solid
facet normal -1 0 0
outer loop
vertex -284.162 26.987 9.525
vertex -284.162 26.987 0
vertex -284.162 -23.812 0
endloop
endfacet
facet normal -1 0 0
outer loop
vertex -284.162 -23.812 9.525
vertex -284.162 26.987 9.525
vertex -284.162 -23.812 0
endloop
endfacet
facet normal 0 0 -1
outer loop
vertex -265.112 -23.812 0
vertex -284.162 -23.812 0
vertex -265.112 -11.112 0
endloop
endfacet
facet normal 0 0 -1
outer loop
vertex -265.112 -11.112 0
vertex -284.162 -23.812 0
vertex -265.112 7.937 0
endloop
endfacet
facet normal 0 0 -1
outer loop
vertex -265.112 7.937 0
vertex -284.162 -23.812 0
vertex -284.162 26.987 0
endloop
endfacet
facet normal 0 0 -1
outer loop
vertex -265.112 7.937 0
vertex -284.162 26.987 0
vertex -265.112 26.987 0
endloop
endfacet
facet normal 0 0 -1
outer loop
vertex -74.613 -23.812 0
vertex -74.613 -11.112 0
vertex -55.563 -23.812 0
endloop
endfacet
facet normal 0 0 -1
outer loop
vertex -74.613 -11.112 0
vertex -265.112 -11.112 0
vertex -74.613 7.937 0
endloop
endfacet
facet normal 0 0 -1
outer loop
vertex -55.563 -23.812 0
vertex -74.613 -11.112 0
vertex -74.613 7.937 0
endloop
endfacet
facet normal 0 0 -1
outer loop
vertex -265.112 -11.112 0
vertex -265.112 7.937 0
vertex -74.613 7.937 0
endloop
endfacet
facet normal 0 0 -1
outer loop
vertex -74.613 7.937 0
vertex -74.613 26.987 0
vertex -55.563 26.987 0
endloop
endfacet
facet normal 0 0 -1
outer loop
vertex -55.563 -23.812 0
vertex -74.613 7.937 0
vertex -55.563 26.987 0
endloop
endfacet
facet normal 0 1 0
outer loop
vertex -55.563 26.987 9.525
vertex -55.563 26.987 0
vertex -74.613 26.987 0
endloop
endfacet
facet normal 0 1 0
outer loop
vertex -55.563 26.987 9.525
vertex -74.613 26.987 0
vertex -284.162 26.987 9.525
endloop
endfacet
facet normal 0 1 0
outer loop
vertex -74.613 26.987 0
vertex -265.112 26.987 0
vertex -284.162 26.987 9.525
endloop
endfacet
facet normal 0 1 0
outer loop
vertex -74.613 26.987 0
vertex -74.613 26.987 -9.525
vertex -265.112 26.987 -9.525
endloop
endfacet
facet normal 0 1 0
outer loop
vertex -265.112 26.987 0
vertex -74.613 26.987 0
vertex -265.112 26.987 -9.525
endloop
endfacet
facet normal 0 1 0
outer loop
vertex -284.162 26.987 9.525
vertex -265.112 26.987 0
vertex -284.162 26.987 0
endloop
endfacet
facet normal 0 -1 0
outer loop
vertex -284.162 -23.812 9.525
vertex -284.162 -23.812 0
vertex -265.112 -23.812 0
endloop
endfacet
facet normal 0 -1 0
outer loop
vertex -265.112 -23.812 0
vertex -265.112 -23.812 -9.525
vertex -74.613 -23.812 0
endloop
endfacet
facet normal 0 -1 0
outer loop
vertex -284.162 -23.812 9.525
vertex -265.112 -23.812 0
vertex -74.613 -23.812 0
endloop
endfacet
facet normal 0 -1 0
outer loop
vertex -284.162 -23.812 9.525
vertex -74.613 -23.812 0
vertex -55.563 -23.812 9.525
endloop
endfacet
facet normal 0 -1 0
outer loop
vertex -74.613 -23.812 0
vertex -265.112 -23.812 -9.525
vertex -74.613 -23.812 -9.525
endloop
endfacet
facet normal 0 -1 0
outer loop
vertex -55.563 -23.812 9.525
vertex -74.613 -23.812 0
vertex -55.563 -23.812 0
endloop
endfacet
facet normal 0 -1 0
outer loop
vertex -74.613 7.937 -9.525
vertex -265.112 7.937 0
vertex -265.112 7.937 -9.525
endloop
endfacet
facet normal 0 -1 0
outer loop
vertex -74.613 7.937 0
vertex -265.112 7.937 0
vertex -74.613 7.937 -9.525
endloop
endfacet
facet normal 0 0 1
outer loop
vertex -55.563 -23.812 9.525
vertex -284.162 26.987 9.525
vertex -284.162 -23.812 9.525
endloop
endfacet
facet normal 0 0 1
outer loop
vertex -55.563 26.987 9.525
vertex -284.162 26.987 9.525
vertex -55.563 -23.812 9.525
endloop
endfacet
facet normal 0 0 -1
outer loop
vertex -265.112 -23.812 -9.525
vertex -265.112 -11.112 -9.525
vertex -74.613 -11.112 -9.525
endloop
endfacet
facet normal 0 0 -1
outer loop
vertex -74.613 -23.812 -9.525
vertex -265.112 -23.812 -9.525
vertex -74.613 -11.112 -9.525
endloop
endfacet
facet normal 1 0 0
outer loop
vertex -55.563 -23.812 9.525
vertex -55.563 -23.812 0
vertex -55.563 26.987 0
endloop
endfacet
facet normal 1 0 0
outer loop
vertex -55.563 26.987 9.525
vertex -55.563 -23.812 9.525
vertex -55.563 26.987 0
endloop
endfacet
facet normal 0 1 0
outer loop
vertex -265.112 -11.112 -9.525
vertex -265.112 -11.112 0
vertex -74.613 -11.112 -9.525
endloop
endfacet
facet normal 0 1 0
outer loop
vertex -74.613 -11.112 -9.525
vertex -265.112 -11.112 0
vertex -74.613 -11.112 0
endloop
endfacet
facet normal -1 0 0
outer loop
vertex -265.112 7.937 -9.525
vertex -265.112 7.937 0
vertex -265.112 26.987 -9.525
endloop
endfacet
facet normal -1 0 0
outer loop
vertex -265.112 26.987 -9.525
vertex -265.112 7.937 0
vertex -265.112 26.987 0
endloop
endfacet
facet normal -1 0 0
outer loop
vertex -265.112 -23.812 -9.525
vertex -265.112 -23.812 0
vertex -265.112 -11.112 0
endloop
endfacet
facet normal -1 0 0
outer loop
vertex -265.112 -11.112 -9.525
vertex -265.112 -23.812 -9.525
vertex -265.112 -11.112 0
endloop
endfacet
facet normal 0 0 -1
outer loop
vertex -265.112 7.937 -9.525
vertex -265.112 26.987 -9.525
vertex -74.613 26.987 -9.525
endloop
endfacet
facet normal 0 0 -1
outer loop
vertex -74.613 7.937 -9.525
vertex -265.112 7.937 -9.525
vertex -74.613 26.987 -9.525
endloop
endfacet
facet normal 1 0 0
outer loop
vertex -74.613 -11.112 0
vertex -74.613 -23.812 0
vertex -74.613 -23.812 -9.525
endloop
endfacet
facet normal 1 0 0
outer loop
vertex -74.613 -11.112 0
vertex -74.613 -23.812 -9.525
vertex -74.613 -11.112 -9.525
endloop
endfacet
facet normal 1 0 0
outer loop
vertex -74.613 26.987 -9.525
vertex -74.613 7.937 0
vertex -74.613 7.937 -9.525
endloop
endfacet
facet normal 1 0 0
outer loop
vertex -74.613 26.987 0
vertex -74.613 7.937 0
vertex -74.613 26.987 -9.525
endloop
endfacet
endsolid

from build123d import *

# Parameters (mm, degrees)
F0_W     = 190.5
F0_H     = 19.05
F0_W_2   = 19.05
F0_H_2   = 12.7
F1_DEPTH = 9.525
F2_DEPTH = 9.525


with BuildPart() as f1:
    # F0 (on Top) → F1 (new body)
    with BuildSketch(Plane.XY):
        with Locations((-169.8625, 17.4625)):
            Rectangle(F0_W, F0_H)
        with Locations((-274.6375, 17.4625)):
            Rectangle(F0_W_2, F0_H)
        with Locations((-169.8625, -1.5875)):
            Rectangle(F0_W, F0_H)
        with Locations((-169.8625, -17.4625)):
            Rectangle(F0_W, F0_H_2)
        with Locations((-274.6375, -17.4625)):
            Rectangle(F0_W_2, F0_H_2)
        with Locations((-274.6375, -1.5875)):
            Rectangle(F0_W_2, F0_H)
        with Locations((-65.0875, 17.4625)):
            Rectangle(F0_W_2, F0_H)
        with Locations((-65.0875, -17.4625)):
            Rectangle(F0_W_2, F0_H_2)
        with Locations((-65.0875, -1.5875)):
            Rectangle(F0_W_2, F0_H)
    extrude(amount=F1_DEPTH)

    # F0 (on Top) → F2 (join)
    with BuildSketch(Plane.XY):
        with Locations((-169.8625, 17.4625)):
            Rectangle(F0_W, F0_H)
        with Locations((-169.8625, -17.4625)):
            Rectangle(F0_W, F0_H_2)
    extrude(amount=-F2_DEPTH)


solid = f1.part
